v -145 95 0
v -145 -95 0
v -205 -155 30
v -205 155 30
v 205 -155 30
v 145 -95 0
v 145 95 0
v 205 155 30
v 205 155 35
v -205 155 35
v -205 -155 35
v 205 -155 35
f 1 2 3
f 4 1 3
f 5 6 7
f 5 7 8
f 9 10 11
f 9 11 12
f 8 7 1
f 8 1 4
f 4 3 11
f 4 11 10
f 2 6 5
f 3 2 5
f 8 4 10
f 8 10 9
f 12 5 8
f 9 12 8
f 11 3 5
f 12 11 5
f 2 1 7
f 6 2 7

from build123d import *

# Parameters (mm, degrees)
F0_W     = 410
F0_H     = 310
F1_DEPTH = 35
F3_DEPTH = 413
F7_DEPTH = 455


with BuildPart() as f1:
    # F0 (on Top) → F1 (new body)
    with BuildSketch(Plane.XY):
        Rectangle(F0_W, F0_H)
    extrude(amount=F1_DEPTH)


with BuildPart() as f3:
    # F2 (on face) → F3 (new body)
    with BuildSketch(Plane.XZ.offset(155)):
        Polygon((-186.286226, -45.123053), (-145, 0), (-205, 30), (-247.468904, 11.412853), align=None)
    extrude(amount=-F3_DEPTH)


with BuildPart() as f4_1:
    # F4: instance of F3
    add(f3.part.mirror(Plane.YZ))


with BuildPart() as f1_1:
    add(f1.part)

    # F5: cut F3, F4_1
    add(f3.part, mode=Mode.SUBTRACT)
    add(f4_1.part, mode=Mode.SUBTRACT)


with BuildPart() as f7:
    # F6 (on face) → F7 (new body)
    with BuildSketch(Plane(origin=(-205, 0, 0), x_dir=(0, -1, 0), z_dir=(-1, 0, 0))):
        Polygon((-155, -27.468236), (-95, 0), (-155, 30), (-189.205855, 15.520646), align=None)
    extrude(amount=-F7_DEPTH)


with BuildPart() as f8_1:
    # F8: instance of F7
    add(f7.part.mirror(Plane.XZ))


with BuildPart() as f1_2:
    add(f1_1.part)

    # F9: cut F7, F8_1
    add(f7.part, mode=Mode.SUBTRACT)
    add(f8_1.part, mode=Mode.SUBTRACT)


solid = f1_2.part
